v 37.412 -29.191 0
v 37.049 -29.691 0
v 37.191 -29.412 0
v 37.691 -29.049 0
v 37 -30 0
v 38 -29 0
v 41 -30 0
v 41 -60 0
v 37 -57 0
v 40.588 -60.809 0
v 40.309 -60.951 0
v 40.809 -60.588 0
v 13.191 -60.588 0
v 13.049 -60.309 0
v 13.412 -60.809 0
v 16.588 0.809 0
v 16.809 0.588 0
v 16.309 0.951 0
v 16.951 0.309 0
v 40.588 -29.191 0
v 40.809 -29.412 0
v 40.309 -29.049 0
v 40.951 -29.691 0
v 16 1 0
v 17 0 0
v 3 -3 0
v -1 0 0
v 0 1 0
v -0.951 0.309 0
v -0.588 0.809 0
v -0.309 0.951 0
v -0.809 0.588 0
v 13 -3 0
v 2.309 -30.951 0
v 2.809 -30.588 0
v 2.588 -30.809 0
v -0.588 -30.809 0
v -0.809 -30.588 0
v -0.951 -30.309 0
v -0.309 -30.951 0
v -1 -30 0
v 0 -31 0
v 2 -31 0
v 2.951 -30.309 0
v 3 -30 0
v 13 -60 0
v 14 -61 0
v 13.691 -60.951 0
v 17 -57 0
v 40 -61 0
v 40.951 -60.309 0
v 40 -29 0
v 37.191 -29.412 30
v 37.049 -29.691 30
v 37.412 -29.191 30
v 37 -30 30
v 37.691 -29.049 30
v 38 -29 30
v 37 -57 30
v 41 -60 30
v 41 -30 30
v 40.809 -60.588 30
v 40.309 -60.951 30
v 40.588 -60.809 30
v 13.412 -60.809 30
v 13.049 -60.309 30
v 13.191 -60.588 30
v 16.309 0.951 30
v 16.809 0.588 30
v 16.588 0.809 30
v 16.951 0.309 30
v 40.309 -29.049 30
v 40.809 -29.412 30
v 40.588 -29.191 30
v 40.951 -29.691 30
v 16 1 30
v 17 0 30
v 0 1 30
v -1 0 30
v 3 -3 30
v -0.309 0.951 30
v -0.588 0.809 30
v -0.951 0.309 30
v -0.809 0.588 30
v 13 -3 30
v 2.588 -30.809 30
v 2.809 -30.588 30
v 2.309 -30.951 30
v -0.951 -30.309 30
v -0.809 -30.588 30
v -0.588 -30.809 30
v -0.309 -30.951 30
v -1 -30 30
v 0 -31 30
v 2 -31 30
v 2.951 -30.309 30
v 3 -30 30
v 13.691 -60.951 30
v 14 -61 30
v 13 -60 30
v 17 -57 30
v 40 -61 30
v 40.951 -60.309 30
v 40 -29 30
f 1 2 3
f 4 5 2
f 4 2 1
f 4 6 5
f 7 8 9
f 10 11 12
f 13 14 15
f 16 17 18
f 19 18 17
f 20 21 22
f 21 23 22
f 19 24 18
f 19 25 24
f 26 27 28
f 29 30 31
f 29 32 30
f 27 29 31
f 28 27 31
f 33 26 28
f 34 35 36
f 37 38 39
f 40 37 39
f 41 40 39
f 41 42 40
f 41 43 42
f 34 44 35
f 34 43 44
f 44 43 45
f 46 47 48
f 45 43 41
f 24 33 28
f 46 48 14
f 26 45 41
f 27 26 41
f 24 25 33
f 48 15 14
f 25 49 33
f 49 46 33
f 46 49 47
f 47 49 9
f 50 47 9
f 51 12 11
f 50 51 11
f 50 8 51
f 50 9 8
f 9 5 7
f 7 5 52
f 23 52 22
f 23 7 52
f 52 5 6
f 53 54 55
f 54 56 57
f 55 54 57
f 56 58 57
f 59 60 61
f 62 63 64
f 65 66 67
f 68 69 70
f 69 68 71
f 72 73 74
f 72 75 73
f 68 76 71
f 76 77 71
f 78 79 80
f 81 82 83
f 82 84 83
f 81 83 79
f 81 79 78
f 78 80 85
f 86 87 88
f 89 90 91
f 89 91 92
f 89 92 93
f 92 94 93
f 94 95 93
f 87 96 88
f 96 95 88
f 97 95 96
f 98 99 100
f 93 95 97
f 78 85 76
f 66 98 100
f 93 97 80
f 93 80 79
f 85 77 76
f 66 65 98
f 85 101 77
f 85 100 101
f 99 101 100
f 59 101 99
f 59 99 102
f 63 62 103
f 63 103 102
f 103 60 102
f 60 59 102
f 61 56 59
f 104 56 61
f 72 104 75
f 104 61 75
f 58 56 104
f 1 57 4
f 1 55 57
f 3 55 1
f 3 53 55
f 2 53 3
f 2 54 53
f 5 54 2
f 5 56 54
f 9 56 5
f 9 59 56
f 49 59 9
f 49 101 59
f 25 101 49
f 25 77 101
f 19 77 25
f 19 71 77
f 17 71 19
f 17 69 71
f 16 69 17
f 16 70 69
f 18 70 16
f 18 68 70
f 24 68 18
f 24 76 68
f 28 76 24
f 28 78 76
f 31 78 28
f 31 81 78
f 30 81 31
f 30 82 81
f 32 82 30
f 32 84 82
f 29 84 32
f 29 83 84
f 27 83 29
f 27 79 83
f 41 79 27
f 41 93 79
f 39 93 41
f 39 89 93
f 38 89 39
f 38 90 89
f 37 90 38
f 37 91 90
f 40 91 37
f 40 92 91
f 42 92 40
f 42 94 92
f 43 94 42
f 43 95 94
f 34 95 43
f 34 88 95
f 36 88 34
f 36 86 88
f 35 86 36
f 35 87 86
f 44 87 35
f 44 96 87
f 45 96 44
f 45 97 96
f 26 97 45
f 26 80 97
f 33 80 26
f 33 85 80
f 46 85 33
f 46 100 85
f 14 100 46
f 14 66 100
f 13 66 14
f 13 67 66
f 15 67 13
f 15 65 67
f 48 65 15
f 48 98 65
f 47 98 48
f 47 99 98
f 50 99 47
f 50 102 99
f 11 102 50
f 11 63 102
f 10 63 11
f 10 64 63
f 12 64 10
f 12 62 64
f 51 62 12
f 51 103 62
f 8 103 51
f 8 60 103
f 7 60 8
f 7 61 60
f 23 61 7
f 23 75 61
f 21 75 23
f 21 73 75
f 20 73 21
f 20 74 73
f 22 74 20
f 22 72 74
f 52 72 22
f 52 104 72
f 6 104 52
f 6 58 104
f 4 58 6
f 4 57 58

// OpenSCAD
$fn = 20;

W = 30; /* width */
H = 60; /* height */
WT = 2; /* wall thickness */
D1 = 10; /* distance 1 */
D2 = 20; /* distance 2 */
H1 = 30; /* height 1 */
H2 = 30; /* height 2 */
CR = 1; /* corner radius */

linear_extrude(W) minkowski() {
    polygon([
        [0,0],
        [D1+2*WT+2*CR,0],
        [D1+2*WT+2*CR,-H+WT],
        [D1+2*WT+D2+4*CR,-H+WT],
        [D1+2*WT+D2+4*CR,-H+H2],
        [D1+3*WT+D2+4*CR,-H+H2],
        [D1+3*WT+D2+4*CR,-H],
        [D1+WT+2*CR,-H],
        [D1+WT+2*CR,-WT],
        [WT,-WT],
        [WT,-H1],
        [0,-H1],
    ]);
    circle(r=CR);
}
